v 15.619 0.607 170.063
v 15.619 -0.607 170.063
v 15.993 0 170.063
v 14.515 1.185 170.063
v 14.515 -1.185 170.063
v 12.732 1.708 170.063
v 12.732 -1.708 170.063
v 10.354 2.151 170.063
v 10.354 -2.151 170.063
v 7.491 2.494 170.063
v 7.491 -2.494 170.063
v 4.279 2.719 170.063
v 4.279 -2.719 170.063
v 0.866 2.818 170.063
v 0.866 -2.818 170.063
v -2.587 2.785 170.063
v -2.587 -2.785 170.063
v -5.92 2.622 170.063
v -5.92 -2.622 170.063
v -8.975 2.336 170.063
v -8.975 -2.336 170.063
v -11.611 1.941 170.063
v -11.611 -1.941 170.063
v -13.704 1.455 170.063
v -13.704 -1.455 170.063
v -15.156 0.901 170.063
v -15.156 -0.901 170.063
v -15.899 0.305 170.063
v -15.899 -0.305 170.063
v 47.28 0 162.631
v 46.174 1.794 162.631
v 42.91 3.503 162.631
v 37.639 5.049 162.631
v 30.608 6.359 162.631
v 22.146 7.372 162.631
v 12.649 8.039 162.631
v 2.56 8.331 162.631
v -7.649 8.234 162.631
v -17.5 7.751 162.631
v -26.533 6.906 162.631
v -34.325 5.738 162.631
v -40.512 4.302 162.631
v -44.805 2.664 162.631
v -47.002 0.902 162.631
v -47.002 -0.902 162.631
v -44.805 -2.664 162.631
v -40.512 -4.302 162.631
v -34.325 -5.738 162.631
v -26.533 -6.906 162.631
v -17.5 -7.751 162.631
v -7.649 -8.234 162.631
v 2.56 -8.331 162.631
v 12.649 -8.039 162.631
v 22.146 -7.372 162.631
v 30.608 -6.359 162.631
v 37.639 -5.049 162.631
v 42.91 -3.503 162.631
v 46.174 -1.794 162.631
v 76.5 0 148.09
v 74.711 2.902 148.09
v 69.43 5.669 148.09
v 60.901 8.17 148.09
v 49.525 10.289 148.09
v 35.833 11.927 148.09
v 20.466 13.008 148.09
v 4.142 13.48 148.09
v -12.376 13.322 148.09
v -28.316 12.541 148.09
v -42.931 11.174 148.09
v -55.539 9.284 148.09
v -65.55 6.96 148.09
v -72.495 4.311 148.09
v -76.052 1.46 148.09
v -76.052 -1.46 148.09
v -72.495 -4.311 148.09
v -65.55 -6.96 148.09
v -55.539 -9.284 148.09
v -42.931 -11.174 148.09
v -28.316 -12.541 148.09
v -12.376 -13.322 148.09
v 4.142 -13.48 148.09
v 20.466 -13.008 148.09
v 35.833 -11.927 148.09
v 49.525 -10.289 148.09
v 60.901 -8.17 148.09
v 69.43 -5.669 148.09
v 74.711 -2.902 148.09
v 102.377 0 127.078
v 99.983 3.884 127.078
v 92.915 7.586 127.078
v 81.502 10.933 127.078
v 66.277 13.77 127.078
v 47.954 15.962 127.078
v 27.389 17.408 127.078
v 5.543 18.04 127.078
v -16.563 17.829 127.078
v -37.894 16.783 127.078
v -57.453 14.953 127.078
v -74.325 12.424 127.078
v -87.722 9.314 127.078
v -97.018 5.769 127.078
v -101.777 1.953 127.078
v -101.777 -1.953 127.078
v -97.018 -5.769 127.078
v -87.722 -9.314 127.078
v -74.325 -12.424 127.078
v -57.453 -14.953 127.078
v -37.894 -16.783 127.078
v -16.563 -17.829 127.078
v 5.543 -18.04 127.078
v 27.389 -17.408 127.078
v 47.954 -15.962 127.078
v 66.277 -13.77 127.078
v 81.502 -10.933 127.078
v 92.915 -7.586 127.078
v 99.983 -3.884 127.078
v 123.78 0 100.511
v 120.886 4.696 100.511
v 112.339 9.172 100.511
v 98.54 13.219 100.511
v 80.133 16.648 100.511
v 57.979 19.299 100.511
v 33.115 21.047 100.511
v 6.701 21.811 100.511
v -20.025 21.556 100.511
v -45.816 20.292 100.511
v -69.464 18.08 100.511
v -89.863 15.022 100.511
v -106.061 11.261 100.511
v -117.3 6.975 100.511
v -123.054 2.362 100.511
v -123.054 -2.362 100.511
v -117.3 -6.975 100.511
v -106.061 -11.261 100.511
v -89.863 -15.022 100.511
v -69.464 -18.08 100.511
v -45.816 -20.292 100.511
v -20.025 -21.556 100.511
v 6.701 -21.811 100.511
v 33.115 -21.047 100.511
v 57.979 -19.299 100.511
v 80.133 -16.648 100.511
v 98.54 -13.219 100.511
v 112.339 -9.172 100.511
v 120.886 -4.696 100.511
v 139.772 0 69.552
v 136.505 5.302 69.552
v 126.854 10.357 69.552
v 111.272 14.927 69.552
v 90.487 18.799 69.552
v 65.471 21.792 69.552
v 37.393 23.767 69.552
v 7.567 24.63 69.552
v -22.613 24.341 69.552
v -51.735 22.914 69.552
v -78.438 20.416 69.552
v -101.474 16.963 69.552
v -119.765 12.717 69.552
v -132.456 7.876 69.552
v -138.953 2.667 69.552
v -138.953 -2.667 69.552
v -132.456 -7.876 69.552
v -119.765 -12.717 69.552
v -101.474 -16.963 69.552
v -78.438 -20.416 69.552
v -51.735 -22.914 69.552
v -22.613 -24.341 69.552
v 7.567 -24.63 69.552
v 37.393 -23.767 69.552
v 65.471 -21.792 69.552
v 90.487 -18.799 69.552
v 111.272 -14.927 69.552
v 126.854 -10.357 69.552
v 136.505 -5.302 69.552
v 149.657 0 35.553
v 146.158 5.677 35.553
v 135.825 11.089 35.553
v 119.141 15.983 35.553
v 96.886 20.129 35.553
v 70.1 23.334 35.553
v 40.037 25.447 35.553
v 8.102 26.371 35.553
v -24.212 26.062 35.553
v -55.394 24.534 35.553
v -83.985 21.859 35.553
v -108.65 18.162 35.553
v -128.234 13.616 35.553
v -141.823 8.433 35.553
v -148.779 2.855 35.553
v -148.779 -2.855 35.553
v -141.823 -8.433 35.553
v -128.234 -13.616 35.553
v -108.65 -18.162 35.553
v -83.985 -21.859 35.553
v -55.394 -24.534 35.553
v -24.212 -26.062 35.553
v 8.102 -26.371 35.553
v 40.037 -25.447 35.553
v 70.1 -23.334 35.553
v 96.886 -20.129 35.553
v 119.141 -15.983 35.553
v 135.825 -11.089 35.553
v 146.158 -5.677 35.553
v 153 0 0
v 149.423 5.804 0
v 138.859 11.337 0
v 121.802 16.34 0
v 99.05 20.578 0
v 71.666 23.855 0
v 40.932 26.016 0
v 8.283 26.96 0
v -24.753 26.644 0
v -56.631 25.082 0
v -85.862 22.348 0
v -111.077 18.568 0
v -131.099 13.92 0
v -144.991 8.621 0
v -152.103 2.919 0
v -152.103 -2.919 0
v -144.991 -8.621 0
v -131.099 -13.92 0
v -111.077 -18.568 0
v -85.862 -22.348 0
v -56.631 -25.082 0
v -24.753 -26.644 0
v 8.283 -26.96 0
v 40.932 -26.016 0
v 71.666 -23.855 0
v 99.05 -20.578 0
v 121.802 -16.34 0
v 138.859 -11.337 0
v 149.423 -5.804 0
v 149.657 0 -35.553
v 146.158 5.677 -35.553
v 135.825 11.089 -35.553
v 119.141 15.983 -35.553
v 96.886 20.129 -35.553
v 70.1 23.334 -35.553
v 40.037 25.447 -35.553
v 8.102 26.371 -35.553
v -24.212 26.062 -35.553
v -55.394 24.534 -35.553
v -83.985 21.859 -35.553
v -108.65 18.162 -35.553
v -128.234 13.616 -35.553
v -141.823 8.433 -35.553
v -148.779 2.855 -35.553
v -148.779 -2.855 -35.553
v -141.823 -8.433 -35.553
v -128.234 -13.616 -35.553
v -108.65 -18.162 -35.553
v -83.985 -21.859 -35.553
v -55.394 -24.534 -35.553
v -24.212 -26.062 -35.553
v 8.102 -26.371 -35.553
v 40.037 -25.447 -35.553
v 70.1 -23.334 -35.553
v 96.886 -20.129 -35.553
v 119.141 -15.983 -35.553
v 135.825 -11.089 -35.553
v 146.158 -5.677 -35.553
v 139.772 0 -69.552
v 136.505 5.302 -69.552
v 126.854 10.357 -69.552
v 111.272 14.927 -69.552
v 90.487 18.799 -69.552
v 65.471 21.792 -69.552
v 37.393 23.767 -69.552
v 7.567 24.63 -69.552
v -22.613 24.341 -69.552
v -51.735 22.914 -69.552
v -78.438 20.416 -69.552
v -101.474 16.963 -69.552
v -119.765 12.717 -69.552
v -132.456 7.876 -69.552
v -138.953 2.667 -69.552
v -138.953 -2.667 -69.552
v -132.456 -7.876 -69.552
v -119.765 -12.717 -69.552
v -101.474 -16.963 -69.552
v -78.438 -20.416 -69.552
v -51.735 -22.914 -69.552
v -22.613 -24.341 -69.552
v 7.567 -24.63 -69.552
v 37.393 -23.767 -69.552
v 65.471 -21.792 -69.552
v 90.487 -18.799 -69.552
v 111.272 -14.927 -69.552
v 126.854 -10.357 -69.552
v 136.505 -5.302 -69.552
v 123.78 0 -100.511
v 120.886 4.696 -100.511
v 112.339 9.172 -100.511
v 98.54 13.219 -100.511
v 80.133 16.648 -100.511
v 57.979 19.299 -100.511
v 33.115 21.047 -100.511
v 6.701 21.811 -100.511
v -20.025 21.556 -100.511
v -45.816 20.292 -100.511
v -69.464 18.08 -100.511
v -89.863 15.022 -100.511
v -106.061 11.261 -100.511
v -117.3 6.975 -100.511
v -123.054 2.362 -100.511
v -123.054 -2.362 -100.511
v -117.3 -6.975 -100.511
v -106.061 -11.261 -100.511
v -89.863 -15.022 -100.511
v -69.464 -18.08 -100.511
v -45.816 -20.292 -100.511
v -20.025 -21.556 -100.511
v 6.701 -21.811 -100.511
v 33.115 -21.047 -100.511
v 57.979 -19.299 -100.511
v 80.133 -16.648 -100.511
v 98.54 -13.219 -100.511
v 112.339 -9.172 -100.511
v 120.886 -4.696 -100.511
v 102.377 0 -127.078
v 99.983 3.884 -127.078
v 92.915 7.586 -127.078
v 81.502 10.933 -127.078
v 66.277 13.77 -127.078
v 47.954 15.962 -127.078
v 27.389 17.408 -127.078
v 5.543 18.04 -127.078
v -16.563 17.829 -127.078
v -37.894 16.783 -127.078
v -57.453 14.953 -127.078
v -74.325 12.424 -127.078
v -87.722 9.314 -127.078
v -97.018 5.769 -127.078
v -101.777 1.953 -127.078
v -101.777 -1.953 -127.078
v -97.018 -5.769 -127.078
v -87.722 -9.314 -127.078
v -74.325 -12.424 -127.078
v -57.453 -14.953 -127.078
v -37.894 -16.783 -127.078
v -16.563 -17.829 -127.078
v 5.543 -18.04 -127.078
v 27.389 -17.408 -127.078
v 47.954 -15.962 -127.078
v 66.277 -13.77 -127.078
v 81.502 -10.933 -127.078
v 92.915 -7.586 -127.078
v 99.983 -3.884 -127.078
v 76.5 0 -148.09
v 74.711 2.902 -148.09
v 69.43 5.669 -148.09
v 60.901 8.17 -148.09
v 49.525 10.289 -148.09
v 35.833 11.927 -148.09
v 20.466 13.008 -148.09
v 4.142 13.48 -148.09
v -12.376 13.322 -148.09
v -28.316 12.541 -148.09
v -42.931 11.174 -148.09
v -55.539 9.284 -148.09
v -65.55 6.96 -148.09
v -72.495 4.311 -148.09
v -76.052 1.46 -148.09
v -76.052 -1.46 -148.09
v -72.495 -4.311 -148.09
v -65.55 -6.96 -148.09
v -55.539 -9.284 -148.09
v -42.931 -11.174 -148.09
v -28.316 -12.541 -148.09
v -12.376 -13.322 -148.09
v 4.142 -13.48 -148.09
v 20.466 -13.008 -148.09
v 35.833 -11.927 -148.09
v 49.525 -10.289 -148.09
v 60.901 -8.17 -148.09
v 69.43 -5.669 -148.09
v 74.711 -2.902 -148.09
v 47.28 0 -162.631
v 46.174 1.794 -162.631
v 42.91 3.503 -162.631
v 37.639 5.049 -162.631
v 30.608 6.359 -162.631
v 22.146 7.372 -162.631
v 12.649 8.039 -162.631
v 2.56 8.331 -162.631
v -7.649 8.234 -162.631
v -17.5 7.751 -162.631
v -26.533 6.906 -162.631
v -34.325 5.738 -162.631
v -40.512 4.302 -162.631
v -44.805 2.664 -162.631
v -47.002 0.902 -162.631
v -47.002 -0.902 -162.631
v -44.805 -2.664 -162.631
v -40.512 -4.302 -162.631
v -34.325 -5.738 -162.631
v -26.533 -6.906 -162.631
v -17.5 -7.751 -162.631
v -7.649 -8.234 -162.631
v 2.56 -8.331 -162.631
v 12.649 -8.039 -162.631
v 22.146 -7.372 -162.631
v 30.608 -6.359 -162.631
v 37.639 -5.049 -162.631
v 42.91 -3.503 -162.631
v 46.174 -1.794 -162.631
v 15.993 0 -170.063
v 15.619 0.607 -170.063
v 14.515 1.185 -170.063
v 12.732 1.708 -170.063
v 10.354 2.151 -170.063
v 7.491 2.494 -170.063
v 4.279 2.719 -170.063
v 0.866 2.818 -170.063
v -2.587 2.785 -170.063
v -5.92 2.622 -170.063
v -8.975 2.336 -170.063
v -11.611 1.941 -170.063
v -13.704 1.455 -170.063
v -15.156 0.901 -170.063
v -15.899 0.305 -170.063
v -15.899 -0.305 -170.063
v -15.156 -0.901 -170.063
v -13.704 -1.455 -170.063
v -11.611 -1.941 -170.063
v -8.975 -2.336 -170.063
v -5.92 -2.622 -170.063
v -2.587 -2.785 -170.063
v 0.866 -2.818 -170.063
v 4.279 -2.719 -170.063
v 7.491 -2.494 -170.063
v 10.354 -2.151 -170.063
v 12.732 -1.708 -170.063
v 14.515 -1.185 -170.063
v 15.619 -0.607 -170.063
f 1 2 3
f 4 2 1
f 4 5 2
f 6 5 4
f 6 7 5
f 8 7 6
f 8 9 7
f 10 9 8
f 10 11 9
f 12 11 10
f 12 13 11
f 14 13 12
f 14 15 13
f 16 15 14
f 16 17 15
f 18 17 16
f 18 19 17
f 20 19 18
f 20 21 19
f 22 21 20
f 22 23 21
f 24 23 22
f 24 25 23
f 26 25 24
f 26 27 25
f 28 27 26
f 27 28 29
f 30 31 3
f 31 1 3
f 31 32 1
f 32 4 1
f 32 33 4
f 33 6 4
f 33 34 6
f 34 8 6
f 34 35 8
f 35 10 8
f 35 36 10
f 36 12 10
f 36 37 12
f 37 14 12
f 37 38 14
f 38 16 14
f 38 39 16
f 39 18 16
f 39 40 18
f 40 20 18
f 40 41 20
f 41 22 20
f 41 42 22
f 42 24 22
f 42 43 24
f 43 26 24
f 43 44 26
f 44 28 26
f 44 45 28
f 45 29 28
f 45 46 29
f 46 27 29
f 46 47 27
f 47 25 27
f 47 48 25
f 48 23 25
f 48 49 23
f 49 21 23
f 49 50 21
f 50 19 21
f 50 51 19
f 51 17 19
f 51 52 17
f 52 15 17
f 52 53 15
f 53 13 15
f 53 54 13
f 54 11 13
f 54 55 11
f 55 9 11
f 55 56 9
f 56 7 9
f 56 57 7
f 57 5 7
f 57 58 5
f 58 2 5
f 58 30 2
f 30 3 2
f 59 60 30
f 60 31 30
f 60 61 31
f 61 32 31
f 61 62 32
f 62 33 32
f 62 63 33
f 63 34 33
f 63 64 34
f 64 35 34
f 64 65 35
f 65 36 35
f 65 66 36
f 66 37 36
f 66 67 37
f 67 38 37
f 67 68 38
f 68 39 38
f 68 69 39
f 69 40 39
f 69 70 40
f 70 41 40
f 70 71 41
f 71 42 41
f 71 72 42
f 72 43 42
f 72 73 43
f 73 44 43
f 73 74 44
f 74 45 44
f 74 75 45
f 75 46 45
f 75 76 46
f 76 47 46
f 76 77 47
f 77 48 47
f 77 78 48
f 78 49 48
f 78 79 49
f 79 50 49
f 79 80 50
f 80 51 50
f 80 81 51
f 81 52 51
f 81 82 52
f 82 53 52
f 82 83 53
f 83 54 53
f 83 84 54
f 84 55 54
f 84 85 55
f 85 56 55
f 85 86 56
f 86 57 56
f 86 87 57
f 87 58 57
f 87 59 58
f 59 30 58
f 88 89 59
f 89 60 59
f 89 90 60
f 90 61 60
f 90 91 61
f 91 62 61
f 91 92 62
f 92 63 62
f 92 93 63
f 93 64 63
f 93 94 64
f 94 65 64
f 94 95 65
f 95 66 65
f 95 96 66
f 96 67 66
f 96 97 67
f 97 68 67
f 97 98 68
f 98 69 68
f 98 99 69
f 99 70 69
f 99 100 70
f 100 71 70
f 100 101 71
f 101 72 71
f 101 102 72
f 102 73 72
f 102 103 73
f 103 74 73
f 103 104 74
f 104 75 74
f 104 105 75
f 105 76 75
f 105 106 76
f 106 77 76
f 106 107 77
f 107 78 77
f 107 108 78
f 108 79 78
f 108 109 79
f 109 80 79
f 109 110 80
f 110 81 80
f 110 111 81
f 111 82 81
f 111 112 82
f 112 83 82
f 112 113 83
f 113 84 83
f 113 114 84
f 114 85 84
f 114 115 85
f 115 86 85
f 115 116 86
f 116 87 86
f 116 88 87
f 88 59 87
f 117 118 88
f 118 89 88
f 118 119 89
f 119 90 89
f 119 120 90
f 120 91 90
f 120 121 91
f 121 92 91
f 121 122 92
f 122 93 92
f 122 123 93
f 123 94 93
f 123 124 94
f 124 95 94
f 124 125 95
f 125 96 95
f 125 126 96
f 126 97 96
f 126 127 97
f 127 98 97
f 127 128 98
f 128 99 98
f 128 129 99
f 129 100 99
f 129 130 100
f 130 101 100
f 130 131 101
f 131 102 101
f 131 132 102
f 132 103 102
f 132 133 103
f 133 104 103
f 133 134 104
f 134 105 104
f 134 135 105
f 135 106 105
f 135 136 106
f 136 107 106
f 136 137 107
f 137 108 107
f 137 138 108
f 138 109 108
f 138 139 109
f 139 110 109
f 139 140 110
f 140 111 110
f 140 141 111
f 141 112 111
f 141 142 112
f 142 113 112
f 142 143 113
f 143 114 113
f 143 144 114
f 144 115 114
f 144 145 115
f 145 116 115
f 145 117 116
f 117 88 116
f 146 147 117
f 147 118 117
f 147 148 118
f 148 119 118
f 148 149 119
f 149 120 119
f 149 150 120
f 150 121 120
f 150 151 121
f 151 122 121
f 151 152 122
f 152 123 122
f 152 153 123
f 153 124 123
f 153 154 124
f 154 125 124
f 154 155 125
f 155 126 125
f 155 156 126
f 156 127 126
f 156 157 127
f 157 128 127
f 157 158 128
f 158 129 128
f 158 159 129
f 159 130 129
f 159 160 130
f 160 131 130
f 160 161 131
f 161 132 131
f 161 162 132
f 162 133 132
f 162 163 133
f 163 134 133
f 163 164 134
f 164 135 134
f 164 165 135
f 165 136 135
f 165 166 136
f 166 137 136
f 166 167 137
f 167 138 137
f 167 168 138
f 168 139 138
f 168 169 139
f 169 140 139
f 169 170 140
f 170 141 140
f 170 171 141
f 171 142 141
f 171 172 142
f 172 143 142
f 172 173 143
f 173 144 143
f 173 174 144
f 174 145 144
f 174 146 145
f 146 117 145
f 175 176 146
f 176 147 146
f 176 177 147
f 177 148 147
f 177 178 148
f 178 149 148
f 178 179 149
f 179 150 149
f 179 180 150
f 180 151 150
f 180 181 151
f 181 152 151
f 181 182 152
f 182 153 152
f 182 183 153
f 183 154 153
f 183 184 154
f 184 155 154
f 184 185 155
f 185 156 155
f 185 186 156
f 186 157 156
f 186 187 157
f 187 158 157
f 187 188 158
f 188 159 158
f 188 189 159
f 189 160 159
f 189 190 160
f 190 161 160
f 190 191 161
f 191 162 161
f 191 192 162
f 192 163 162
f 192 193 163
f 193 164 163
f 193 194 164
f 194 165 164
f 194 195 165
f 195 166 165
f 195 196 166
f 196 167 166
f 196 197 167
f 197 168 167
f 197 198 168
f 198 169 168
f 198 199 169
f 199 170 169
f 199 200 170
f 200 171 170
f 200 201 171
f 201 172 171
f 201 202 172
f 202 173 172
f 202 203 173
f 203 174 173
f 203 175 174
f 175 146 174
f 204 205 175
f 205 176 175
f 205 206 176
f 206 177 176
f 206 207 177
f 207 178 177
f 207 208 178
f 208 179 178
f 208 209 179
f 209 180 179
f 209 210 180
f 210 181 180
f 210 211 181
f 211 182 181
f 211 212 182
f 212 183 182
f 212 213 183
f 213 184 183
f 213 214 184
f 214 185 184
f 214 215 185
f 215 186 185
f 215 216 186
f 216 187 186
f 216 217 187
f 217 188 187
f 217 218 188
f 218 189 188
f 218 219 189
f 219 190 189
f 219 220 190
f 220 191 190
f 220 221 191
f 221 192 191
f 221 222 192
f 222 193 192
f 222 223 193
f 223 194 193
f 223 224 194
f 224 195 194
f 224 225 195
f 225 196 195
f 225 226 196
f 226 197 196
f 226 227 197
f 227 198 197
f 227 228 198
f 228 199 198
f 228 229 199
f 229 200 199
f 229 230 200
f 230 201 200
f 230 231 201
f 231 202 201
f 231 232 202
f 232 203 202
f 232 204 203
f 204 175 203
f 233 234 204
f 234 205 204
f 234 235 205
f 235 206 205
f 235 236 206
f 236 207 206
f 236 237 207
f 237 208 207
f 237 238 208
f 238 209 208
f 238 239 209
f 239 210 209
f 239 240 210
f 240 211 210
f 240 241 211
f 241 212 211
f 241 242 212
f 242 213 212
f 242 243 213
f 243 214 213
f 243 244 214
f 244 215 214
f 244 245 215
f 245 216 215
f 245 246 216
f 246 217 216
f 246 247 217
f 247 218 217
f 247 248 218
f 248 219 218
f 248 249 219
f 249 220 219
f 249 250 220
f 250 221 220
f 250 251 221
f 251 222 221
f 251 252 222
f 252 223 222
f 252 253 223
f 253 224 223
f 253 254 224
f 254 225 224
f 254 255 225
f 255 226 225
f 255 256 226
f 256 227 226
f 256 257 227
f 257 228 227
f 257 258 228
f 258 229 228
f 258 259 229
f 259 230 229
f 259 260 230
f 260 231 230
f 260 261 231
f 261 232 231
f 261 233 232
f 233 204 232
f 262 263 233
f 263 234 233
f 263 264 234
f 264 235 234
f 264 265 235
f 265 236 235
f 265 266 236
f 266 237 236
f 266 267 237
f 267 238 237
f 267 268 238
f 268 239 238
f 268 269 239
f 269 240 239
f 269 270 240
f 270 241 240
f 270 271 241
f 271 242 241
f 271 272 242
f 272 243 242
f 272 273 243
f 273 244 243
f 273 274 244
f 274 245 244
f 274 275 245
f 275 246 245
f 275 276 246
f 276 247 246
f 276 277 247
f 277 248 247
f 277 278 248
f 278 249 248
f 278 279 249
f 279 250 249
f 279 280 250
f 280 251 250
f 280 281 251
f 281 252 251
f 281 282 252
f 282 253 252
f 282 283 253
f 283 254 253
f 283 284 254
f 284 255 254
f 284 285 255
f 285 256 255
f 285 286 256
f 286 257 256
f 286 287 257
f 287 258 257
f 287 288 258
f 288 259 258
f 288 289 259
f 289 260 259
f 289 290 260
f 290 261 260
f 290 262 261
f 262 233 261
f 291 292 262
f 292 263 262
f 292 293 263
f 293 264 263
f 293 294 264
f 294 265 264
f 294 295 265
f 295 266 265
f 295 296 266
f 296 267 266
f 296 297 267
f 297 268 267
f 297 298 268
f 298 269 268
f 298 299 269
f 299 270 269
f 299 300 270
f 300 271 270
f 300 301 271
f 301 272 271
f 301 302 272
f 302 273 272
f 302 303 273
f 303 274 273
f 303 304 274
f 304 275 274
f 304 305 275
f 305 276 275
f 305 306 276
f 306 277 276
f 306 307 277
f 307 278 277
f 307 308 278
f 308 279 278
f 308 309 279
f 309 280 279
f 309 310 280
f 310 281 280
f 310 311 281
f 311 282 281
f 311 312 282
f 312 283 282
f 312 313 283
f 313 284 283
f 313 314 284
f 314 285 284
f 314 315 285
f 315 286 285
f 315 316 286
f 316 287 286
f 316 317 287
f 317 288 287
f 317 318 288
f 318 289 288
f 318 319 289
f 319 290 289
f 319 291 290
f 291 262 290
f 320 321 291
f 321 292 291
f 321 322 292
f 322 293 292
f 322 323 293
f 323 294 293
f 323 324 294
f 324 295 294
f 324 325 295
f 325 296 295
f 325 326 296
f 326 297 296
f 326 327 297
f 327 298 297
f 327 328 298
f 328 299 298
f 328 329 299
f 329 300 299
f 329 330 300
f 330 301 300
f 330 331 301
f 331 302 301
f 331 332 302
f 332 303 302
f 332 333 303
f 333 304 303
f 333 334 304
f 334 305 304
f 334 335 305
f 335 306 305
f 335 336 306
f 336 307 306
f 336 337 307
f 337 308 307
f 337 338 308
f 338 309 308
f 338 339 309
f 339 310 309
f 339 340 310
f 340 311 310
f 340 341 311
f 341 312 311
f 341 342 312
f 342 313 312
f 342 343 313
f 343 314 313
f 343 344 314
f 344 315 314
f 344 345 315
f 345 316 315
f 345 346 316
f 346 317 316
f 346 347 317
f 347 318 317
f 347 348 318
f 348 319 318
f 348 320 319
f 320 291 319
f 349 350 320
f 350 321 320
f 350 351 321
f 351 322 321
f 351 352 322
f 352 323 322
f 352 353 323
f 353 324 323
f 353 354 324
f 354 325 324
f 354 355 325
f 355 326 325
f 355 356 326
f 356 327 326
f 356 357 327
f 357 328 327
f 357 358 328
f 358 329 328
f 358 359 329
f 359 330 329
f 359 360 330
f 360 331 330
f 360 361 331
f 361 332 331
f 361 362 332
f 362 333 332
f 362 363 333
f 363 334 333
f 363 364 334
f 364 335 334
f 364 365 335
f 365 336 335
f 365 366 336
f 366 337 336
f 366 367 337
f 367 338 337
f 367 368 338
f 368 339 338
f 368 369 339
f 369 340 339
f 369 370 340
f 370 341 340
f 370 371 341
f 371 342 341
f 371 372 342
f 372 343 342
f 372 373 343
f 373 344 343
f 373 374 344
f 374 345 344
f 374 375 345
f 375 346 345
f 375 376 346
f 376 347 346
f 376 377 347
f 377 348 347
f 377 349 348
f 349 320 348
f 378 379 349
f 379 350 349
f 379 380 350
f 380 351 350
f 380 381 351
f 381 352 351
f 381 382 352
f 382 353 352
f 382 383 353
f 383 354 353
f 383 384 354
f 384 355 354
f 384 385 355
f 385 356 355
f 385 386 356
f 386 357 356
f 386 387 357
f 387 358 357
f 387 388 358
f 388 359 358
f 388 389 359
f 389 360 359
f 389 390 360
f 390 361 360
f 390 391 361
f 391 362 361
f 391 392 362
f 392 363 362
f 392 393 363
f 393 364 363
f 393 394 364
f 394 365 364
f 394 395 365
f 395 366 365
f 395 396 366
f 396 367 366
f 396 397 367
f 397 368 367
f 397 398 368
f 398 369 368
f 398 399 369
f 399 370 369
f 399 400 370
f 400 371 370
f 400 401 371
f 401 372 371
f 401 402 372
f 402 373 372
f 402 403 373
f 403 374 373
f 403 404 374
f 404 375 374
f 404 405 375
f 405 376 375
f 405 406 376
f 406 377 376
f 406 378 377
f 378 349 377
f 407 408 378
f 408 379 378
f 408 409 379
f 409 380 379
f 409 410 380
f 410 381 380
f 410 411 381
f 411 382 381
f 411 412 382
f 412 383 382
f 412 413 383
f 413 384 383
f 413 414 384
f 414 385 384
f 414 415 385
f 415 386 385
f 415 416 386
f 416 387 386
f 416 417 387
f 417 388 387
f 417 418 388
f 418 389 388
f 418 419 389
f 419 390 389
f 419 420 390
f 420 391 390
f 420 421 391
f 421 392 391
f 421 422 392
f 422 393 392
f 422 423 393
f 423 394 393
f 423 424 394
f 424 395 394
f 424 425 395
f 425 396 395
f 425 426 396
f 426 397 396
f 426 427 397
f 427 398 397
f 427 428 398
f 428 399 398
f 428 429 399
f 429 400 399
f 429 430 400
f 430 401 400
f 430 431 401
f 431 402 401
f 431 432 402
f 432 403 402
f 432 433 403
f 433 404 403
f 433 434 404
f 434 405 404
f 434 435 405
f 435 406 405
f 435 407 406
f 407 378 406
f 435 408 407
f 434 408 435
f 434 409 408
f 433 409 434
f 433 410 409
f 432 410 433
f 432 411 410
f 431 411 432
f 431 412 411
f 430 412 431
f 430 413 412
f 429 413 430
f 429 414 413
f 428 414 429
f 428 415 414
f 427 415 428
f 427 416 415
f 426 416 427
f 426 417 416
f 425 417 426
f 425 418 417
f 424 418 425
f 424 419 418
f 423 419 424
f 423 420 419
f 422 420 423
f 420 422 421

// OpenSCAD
// Generated by SolidPython 1.0.1 on 2020-07-29 00:46:52


scale(v = [17, 3, 19]) {
	sphere(r = 9);
}
/***********************************************
*********      SolidPython code:      **********
************************************************
 
# import packages: SolidPython
from solid import *
from solid.utils import *
from itertools import chain, combinations, permutations


class Resize:

    def __init__(self, scad_file):
        self.scad_file = scad_file
        #self.scad_file = import_scad(scad_file)
        # cone/cylinder param:
        self.r1 = 0
        self.r2 = 0
        self.h = 0
        # rectangular prism param:
        self.w = 0
        self.l = 0
        # ellipse param:
        self.r = 0

    # import OpenScad code (file name corresponds to shape)


    # classify shape + parameters
    def assign(self, param1, param2, param3):
        if self.scad_file == 'cone.scad':
            self.r1 = param1
            self.r2 = param2
            self.h = param3
        elif self.scad_file == 'cylinder.scad':
            self.r1 = param1
            self.r2 = param2
            self.h = param3
        elif self.scad_file == 'rectangularPrism.scad':
            self.h = param1
            self.l = param2
            self.w = param3
        else:
            self.r = param1
            self.h = param2

    # resize parameters
    def iterate(self):
        x = range(3, 20, 2)
        i = 1
        if self.scad_file == 'cone.scad':
            tempList = list(permutations(x, 2))
            for temp in tempList:
                param1 = temp[0]
                param2 = temp[1]
                filepath = 'produced_scad_files/' + 'cone' + str(param1) + '_' + str(param2) + '_' + '.scad'
                scad_render_to_file(cylinder(h=param1, r1=param2, r2=0), filepath)

        elif self.scad_file == 'cylinder.scad':
            tempList = list(permutations(x, 3))
            for temp in tempList:
                param1 = temp[0]
                param2 = temp[1]
                filepath = 'produced_scad_files/' + 'cylinder' + str(param1) + '_' + str(param2) + '_' + '.scad'
                scad_render_to_file(cylinder(h=param1, r1=param2, r2=param2), filepath)

        elif self.scad_file == 'rectangularPrism.scad':
            tempList = list(permutations(x, 3))
            for temp in tempList:
                param1 = temp[0]
                param2 = temp[1]
                param3 = temp[2]
                filepath = 'produced_scad_files/' + 'rectangularPrism' + str(param1) + '_' + str(param2) + '_' + str(
                    param3) + '.scad'
                scad_render_to_file(cube(size=(param1, param2, param3)), filepath)

        elif self.scad_file == 'ellipse.scad':
            tempList = list(permutations(x, 4))
            for temp in tempList:
                param1 = temp[0]
                param2 = temp[1]
                param3 = temp[2]
                param4 = temp[3]
                filepath = 'produced_scad_files/' + 'ellipse' + str(param1) + '_' + str(param2) + '_' + str(param3) + '_' + str(param4) + '.scad'
                scad_render_to_file(scale([param1, param2, param3])(sphere(r=param4)), filepath)

    def render_to_scadfile(self):
        scad_render_to_file(scad, 'example.scad') 
 
************************************************/
